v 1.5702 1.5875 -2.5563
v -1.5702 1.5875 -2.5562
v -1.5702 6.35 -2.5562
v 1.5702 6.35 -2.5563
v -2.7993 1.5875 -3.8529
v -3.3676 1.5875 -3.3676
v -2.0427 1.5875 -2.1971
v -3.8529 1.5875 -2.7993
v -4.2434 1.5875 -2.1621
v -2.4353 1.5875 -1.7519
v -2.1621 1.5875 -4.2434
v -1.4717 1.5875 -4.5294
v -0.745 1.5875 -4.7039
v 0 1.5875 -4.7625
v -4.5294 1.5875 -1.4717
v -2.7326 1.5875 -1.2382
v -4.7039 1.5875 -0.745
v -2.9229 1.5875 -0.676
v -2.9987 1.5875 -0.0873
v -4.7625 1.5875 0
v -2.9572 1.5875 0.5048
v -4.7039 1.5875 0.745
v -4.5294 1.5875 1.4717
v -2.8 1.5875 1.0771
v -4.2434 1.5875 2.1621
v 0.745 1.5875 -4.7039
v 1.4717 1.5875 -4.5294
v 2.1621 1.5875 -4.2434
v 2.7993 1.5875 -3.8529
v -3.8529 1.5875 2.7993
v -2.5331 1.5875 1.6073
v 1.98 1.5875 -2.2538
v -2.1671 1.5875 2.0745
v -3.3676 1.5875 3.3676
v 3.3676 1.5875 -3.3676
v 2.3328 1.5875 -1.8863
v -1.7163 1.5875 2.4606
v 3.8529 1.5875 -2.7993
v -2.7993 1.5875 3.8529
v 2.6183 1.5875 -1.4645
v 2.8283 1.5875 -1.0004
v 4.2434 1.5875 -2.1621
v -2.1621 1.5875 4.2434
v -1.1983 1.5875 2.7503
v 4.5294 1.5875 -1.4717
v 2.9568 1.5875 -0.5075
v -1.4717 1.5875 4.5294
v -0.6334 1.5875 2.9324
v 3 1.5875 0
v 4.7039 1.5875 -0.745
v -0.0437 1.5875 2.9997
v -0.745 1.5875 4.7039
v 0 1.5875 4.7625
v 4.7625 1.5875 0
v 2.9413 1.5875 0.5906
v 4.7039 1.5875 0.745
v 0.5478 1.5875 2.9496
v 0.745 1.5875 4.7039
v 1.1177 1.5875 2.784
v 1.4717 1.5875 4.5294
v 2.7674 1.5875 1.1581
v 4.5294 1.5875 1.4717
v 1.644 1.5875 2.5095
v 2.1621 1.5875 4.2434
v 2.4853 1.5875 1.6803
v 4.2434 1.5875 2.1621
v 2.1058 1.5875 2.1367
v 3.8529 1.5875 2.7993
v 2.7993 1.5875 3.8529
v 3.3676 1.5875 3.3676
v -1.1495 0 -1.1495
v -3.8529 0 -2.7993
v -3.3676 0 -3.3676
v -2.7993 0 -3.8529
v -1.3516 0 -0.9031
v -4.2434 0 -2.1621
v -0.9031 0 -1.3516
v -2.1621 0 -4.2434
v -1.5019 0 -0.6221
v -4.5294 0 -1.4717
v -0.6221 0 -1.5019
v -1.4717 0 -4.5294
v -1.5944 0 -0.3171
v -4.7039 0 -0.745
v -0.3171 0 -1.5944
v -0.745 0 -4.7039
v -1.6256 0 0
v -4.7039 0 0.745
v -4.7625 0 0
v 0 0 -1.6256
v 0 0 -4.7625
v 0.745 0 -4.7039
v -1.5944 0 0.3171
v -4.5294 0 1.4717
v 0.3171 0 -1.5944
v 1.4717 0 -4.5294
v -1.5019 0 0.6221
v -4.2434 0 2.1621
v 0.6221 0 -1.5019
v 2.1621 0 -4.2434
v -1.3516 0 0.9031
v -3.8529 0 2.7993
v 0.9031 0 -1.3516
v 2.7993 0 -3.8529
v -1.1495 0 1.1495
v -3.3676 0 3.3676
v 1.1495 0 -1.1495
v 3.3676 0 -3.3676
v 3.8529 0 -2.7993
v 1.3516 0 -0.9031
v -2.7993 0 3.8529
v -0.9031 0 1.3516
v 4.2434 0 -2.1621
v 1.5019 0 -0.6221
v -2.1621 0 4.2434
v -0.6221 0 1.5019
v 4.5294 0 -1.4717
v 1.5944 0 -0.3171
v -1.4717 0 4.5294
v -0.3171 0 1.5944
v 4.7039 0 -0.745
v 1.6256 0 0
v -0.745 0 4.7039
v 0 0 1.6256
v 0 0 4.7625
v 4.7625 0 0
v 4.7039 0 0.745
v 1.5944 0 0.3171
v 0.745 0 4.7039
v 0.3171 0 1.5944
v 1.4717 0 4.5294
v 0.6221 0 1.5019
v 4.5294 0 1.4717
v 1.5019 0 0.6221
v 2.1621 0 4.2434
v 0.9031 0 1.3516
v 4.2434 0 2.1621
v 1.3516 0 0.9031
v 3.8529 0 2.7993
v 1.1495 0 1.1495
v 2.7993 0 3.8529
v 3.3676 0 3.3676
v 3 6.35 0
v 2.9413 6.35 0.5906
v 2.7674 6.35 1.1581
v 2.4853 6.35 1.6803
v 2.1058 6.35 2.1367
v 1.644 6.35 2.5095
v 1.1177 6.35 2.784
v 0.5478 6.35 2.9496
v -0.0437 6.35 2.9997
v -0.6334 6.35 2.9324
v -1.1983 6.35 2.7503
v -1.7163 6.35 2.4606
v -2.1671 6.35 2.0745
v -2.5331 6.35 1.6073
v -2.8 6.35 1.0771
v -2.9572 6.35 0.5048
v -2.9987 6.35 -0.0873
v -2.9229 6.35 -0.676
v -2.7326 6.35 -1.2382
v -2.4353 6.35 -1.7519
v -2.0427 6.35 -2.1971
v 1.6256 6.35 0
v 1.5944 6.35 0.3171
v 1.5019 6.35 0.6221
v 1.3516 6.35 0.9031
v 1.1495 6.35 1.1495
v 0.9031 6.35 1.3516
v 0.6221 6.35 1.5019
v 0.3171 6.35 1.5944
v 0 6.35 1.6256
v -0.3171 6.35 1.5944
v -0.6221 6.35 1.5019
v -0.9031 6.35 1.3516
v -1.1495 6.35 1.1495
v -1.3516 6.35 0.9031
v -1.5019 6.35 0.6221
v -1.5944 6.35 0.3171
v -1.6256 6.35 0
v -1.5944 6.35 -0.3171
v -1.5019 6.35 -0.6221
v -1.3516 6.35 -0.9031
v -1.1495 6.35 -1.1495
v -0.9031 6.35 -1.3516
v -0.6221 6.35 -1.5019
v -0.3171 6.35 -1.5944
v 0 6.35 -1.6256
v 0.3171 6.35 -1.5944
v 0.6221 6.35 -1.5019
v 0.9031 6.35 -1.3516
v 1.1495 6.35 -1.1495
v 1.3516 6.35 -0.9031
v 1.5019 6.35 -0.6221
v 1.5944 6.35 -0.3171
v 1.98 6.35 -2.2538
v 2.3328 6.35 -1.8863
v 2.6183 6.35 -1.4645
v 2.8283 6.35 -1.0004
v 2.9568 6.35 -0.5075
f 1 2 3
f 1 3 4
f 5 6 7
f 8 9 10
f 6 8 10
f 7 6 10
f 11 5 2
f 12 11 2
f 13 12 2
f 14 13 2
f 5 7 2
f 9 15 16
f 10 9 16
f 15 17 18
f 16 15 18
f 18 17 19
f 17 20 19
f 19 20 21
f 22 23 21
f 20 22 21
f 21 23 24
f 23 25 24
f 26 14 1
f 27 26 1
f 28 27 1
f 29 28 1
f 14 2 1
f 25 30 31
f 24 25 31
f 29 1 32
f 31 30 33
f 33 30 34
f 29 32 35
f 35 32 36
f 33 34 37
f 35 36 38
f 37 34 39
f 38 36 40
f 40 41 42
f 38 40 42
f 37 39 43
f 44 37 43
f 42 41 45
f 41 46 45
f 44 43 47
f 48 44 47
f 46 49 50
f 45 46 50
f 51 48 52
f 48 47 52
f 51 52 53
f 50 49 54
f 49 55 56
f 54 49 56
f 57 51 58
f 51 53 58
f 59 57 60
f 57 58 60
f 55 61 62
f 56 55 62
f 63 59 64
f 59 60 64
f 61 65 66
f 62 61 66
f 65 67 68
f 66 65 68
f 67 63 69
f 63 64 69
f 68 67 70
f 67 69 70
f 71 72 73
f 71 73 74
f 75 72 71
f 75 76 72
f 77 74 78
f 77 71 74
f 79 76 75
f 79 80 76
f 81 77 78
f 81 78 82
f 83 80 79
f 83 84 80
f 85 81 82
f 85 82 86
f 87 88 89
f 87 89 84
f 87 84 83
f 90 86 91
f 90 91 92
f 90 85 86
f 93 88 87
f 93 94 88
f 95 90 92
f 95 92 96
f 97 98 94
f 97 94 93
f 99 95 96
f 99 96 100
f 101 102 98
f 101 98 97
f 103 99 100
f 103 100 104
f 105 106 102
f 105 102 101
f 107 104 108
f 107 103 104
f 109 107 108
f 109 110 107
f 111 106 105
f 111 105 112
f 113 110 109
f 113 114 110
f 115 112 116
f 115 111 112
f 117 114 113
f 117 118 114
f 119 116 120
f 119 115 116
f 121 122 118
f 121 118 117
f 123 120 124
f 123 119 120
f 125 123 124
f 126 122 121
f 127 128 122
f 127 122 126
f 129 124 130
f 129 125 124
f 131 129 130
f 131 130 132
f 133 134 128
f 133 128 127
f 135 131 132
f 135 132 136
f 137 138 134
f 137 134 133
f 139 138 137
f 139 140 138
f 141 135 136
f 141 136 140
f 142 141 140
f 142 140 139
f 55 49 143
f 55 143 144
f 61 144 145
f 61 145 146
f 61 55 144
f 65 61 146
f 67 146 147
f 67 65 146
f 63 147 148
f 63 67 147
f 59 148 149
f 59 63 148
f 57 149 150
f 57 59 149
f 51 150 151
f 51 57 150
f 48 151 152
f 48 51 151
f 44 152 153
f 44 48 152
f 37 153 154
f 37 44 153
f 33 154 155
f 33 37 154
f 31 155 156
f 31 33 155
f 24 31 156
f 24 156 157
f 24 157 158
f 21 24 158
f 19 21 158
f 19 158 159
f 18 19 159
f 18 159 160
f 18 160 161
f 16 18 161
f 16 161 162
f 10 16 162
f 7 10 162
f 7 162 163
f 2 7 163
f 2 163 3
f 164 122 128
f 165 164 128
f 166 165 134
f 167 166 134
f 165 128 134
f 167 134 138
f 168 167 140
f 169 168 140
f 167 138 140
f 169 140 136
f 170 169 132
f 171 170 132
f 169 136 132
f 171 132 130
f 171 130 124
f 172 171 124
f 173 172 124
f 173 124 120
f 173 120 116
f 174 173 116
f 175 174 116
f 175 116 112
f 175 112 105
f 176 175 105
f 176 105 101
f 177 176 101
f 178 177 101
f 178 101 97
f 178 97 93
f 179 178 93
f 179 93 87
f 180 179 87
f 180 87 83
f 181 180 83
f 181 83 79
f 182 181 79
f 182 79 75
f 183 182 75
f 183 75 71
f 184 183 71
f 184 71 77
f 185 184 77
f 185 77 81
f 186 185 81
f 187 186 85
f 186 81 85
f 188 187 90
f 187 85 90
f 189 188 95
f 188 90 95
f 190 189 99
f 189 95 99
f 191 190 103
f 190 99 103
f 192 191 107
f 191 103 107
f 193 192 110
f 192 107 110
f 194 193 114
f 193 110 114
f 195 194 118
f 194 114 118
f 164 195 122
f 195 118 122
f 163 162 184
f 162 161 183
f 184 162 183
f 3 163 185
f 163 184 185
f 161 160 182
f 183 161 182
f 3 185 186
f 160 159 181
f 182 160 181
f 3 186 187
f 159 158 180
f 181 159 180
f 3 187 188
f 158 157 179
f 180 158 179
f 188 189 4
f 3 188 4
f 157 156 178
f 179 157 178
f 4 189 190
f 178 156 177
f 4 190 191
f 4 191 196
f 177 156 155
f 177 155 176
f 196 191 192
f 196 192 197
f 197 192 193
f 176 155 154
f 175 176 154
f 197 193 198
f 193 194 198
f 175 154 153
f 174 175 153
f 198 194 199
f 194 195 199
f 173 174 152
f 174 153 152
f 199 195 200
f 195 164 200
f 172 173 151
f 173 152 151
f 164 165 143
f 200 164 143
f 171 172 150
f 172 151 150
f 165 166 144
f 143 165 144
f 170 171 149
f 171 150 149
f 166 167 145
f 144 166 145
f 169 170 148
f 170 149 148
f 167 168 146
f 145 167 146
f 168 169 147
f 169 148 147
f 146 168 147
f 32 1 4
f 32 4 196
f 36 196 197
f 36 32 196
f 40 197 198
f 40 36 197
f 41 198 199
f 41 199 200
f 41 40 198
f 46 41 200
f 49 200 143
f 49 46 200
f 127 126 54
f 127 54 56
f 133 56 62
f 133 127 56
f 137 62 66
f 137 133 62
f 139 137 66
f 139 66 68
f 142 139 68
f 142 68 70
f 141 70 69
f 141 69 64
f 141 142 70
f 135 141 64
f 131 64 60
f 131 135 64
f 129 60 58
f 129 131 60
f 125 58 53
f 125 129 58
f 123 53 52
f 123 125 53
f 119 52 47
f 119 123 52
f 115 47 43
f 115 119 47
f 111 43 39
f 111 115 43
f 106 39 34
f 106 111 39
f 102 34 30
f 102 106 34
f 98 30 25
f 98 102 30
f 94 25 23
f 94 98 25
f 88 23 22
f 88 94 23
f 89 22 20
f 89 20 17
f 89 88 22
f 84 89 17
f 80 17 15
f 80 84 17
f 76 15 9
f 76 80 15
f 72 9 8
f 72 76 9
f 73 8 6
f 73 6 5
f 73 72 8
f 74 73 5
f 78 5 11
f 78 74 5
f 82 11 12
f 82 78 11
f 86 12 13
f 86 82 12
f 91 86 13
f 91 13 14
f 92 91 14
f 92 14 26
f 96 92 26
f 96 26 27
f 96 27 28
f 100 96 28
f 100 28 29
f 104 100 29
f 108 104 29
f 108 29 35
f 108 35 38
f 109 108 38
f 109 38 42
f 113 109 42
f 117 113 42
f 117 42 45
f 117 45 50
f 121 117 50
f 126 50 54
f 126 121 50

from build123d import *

# Parameters (mm, degrees)
F0_R     = 4.7625
F0_R_2   = 1.6256
F1_DEPTH = 1.5875
F2_DEPTH = 6.35


with BuildPart() as f1:
    # F0 (on Front) → F1 (new body)
    with BuildSketch(Plane.XZ):
        Circle(F0_R)
        with BuildLine():
            ThreePointArc((-1.5702184362, -2.55625), (-1.464469988, 2.6182680639), (3, 0))
            ThreePointArc((3, 0), (2.6182680639, -1.464469988), (1.5702184362, -2.55625))
            ThreePointArc((1.5702184362, -2.55625), (0, -3), (-1.5702184362, -2.55625))
        make_face(mode=Mode.SUBTRACT)
        with BuildLine():
            ThreePointArc((1.5702184362, -2.55625), (2.6182680639, -1.464469988), (3, 0))
            ThreePointArc((3, 0), (-1.464469988, 2.6182680639), (-1.5702184362, -2.55625))
            Line((-1.5702184362, -2.55625), (0, -2.55625))
            Line((0, -2.55625), (1.5702184362, -2.55625))
        make_face()
        Circle(F0_R_2, mode=Mode.SUBTRACT)
        with BuildLine():
            Line((0, -2.55625), (-1.5702184362, -2.55625))
            ThreePointArc((-1.5702184362, -2.55625), (0, -3), (1.5702184362, -2.55625))
            Line((1.5702184362, -2.55625), (0, -2.55625))
        make_face()
    extrude(amount=-F1_DEPTH)

    # F0 (on Front) → F2 (join)
    with BuildSketch(Plane.XZ):
        with BuildLine():
            ThreePointArc((1.5702184362, -2.55625), (2.6182680639, -1.464469988), (3, 0))
            ThreePointArc((3, 0), (-1.464469988, 2.6182680639), (-1.5702184362, -2.55625))
            Line((-1.5702184362, -2.55625), (0, -2.55625))
            Line((0, -2.55625), (1.5702184362, -2.55625))
        make_face()
        Circle(F0_R_2, mode=Mode.SUBTRACT)
    extrude(amount=-F2_DEPTH)


solid = f1.part
